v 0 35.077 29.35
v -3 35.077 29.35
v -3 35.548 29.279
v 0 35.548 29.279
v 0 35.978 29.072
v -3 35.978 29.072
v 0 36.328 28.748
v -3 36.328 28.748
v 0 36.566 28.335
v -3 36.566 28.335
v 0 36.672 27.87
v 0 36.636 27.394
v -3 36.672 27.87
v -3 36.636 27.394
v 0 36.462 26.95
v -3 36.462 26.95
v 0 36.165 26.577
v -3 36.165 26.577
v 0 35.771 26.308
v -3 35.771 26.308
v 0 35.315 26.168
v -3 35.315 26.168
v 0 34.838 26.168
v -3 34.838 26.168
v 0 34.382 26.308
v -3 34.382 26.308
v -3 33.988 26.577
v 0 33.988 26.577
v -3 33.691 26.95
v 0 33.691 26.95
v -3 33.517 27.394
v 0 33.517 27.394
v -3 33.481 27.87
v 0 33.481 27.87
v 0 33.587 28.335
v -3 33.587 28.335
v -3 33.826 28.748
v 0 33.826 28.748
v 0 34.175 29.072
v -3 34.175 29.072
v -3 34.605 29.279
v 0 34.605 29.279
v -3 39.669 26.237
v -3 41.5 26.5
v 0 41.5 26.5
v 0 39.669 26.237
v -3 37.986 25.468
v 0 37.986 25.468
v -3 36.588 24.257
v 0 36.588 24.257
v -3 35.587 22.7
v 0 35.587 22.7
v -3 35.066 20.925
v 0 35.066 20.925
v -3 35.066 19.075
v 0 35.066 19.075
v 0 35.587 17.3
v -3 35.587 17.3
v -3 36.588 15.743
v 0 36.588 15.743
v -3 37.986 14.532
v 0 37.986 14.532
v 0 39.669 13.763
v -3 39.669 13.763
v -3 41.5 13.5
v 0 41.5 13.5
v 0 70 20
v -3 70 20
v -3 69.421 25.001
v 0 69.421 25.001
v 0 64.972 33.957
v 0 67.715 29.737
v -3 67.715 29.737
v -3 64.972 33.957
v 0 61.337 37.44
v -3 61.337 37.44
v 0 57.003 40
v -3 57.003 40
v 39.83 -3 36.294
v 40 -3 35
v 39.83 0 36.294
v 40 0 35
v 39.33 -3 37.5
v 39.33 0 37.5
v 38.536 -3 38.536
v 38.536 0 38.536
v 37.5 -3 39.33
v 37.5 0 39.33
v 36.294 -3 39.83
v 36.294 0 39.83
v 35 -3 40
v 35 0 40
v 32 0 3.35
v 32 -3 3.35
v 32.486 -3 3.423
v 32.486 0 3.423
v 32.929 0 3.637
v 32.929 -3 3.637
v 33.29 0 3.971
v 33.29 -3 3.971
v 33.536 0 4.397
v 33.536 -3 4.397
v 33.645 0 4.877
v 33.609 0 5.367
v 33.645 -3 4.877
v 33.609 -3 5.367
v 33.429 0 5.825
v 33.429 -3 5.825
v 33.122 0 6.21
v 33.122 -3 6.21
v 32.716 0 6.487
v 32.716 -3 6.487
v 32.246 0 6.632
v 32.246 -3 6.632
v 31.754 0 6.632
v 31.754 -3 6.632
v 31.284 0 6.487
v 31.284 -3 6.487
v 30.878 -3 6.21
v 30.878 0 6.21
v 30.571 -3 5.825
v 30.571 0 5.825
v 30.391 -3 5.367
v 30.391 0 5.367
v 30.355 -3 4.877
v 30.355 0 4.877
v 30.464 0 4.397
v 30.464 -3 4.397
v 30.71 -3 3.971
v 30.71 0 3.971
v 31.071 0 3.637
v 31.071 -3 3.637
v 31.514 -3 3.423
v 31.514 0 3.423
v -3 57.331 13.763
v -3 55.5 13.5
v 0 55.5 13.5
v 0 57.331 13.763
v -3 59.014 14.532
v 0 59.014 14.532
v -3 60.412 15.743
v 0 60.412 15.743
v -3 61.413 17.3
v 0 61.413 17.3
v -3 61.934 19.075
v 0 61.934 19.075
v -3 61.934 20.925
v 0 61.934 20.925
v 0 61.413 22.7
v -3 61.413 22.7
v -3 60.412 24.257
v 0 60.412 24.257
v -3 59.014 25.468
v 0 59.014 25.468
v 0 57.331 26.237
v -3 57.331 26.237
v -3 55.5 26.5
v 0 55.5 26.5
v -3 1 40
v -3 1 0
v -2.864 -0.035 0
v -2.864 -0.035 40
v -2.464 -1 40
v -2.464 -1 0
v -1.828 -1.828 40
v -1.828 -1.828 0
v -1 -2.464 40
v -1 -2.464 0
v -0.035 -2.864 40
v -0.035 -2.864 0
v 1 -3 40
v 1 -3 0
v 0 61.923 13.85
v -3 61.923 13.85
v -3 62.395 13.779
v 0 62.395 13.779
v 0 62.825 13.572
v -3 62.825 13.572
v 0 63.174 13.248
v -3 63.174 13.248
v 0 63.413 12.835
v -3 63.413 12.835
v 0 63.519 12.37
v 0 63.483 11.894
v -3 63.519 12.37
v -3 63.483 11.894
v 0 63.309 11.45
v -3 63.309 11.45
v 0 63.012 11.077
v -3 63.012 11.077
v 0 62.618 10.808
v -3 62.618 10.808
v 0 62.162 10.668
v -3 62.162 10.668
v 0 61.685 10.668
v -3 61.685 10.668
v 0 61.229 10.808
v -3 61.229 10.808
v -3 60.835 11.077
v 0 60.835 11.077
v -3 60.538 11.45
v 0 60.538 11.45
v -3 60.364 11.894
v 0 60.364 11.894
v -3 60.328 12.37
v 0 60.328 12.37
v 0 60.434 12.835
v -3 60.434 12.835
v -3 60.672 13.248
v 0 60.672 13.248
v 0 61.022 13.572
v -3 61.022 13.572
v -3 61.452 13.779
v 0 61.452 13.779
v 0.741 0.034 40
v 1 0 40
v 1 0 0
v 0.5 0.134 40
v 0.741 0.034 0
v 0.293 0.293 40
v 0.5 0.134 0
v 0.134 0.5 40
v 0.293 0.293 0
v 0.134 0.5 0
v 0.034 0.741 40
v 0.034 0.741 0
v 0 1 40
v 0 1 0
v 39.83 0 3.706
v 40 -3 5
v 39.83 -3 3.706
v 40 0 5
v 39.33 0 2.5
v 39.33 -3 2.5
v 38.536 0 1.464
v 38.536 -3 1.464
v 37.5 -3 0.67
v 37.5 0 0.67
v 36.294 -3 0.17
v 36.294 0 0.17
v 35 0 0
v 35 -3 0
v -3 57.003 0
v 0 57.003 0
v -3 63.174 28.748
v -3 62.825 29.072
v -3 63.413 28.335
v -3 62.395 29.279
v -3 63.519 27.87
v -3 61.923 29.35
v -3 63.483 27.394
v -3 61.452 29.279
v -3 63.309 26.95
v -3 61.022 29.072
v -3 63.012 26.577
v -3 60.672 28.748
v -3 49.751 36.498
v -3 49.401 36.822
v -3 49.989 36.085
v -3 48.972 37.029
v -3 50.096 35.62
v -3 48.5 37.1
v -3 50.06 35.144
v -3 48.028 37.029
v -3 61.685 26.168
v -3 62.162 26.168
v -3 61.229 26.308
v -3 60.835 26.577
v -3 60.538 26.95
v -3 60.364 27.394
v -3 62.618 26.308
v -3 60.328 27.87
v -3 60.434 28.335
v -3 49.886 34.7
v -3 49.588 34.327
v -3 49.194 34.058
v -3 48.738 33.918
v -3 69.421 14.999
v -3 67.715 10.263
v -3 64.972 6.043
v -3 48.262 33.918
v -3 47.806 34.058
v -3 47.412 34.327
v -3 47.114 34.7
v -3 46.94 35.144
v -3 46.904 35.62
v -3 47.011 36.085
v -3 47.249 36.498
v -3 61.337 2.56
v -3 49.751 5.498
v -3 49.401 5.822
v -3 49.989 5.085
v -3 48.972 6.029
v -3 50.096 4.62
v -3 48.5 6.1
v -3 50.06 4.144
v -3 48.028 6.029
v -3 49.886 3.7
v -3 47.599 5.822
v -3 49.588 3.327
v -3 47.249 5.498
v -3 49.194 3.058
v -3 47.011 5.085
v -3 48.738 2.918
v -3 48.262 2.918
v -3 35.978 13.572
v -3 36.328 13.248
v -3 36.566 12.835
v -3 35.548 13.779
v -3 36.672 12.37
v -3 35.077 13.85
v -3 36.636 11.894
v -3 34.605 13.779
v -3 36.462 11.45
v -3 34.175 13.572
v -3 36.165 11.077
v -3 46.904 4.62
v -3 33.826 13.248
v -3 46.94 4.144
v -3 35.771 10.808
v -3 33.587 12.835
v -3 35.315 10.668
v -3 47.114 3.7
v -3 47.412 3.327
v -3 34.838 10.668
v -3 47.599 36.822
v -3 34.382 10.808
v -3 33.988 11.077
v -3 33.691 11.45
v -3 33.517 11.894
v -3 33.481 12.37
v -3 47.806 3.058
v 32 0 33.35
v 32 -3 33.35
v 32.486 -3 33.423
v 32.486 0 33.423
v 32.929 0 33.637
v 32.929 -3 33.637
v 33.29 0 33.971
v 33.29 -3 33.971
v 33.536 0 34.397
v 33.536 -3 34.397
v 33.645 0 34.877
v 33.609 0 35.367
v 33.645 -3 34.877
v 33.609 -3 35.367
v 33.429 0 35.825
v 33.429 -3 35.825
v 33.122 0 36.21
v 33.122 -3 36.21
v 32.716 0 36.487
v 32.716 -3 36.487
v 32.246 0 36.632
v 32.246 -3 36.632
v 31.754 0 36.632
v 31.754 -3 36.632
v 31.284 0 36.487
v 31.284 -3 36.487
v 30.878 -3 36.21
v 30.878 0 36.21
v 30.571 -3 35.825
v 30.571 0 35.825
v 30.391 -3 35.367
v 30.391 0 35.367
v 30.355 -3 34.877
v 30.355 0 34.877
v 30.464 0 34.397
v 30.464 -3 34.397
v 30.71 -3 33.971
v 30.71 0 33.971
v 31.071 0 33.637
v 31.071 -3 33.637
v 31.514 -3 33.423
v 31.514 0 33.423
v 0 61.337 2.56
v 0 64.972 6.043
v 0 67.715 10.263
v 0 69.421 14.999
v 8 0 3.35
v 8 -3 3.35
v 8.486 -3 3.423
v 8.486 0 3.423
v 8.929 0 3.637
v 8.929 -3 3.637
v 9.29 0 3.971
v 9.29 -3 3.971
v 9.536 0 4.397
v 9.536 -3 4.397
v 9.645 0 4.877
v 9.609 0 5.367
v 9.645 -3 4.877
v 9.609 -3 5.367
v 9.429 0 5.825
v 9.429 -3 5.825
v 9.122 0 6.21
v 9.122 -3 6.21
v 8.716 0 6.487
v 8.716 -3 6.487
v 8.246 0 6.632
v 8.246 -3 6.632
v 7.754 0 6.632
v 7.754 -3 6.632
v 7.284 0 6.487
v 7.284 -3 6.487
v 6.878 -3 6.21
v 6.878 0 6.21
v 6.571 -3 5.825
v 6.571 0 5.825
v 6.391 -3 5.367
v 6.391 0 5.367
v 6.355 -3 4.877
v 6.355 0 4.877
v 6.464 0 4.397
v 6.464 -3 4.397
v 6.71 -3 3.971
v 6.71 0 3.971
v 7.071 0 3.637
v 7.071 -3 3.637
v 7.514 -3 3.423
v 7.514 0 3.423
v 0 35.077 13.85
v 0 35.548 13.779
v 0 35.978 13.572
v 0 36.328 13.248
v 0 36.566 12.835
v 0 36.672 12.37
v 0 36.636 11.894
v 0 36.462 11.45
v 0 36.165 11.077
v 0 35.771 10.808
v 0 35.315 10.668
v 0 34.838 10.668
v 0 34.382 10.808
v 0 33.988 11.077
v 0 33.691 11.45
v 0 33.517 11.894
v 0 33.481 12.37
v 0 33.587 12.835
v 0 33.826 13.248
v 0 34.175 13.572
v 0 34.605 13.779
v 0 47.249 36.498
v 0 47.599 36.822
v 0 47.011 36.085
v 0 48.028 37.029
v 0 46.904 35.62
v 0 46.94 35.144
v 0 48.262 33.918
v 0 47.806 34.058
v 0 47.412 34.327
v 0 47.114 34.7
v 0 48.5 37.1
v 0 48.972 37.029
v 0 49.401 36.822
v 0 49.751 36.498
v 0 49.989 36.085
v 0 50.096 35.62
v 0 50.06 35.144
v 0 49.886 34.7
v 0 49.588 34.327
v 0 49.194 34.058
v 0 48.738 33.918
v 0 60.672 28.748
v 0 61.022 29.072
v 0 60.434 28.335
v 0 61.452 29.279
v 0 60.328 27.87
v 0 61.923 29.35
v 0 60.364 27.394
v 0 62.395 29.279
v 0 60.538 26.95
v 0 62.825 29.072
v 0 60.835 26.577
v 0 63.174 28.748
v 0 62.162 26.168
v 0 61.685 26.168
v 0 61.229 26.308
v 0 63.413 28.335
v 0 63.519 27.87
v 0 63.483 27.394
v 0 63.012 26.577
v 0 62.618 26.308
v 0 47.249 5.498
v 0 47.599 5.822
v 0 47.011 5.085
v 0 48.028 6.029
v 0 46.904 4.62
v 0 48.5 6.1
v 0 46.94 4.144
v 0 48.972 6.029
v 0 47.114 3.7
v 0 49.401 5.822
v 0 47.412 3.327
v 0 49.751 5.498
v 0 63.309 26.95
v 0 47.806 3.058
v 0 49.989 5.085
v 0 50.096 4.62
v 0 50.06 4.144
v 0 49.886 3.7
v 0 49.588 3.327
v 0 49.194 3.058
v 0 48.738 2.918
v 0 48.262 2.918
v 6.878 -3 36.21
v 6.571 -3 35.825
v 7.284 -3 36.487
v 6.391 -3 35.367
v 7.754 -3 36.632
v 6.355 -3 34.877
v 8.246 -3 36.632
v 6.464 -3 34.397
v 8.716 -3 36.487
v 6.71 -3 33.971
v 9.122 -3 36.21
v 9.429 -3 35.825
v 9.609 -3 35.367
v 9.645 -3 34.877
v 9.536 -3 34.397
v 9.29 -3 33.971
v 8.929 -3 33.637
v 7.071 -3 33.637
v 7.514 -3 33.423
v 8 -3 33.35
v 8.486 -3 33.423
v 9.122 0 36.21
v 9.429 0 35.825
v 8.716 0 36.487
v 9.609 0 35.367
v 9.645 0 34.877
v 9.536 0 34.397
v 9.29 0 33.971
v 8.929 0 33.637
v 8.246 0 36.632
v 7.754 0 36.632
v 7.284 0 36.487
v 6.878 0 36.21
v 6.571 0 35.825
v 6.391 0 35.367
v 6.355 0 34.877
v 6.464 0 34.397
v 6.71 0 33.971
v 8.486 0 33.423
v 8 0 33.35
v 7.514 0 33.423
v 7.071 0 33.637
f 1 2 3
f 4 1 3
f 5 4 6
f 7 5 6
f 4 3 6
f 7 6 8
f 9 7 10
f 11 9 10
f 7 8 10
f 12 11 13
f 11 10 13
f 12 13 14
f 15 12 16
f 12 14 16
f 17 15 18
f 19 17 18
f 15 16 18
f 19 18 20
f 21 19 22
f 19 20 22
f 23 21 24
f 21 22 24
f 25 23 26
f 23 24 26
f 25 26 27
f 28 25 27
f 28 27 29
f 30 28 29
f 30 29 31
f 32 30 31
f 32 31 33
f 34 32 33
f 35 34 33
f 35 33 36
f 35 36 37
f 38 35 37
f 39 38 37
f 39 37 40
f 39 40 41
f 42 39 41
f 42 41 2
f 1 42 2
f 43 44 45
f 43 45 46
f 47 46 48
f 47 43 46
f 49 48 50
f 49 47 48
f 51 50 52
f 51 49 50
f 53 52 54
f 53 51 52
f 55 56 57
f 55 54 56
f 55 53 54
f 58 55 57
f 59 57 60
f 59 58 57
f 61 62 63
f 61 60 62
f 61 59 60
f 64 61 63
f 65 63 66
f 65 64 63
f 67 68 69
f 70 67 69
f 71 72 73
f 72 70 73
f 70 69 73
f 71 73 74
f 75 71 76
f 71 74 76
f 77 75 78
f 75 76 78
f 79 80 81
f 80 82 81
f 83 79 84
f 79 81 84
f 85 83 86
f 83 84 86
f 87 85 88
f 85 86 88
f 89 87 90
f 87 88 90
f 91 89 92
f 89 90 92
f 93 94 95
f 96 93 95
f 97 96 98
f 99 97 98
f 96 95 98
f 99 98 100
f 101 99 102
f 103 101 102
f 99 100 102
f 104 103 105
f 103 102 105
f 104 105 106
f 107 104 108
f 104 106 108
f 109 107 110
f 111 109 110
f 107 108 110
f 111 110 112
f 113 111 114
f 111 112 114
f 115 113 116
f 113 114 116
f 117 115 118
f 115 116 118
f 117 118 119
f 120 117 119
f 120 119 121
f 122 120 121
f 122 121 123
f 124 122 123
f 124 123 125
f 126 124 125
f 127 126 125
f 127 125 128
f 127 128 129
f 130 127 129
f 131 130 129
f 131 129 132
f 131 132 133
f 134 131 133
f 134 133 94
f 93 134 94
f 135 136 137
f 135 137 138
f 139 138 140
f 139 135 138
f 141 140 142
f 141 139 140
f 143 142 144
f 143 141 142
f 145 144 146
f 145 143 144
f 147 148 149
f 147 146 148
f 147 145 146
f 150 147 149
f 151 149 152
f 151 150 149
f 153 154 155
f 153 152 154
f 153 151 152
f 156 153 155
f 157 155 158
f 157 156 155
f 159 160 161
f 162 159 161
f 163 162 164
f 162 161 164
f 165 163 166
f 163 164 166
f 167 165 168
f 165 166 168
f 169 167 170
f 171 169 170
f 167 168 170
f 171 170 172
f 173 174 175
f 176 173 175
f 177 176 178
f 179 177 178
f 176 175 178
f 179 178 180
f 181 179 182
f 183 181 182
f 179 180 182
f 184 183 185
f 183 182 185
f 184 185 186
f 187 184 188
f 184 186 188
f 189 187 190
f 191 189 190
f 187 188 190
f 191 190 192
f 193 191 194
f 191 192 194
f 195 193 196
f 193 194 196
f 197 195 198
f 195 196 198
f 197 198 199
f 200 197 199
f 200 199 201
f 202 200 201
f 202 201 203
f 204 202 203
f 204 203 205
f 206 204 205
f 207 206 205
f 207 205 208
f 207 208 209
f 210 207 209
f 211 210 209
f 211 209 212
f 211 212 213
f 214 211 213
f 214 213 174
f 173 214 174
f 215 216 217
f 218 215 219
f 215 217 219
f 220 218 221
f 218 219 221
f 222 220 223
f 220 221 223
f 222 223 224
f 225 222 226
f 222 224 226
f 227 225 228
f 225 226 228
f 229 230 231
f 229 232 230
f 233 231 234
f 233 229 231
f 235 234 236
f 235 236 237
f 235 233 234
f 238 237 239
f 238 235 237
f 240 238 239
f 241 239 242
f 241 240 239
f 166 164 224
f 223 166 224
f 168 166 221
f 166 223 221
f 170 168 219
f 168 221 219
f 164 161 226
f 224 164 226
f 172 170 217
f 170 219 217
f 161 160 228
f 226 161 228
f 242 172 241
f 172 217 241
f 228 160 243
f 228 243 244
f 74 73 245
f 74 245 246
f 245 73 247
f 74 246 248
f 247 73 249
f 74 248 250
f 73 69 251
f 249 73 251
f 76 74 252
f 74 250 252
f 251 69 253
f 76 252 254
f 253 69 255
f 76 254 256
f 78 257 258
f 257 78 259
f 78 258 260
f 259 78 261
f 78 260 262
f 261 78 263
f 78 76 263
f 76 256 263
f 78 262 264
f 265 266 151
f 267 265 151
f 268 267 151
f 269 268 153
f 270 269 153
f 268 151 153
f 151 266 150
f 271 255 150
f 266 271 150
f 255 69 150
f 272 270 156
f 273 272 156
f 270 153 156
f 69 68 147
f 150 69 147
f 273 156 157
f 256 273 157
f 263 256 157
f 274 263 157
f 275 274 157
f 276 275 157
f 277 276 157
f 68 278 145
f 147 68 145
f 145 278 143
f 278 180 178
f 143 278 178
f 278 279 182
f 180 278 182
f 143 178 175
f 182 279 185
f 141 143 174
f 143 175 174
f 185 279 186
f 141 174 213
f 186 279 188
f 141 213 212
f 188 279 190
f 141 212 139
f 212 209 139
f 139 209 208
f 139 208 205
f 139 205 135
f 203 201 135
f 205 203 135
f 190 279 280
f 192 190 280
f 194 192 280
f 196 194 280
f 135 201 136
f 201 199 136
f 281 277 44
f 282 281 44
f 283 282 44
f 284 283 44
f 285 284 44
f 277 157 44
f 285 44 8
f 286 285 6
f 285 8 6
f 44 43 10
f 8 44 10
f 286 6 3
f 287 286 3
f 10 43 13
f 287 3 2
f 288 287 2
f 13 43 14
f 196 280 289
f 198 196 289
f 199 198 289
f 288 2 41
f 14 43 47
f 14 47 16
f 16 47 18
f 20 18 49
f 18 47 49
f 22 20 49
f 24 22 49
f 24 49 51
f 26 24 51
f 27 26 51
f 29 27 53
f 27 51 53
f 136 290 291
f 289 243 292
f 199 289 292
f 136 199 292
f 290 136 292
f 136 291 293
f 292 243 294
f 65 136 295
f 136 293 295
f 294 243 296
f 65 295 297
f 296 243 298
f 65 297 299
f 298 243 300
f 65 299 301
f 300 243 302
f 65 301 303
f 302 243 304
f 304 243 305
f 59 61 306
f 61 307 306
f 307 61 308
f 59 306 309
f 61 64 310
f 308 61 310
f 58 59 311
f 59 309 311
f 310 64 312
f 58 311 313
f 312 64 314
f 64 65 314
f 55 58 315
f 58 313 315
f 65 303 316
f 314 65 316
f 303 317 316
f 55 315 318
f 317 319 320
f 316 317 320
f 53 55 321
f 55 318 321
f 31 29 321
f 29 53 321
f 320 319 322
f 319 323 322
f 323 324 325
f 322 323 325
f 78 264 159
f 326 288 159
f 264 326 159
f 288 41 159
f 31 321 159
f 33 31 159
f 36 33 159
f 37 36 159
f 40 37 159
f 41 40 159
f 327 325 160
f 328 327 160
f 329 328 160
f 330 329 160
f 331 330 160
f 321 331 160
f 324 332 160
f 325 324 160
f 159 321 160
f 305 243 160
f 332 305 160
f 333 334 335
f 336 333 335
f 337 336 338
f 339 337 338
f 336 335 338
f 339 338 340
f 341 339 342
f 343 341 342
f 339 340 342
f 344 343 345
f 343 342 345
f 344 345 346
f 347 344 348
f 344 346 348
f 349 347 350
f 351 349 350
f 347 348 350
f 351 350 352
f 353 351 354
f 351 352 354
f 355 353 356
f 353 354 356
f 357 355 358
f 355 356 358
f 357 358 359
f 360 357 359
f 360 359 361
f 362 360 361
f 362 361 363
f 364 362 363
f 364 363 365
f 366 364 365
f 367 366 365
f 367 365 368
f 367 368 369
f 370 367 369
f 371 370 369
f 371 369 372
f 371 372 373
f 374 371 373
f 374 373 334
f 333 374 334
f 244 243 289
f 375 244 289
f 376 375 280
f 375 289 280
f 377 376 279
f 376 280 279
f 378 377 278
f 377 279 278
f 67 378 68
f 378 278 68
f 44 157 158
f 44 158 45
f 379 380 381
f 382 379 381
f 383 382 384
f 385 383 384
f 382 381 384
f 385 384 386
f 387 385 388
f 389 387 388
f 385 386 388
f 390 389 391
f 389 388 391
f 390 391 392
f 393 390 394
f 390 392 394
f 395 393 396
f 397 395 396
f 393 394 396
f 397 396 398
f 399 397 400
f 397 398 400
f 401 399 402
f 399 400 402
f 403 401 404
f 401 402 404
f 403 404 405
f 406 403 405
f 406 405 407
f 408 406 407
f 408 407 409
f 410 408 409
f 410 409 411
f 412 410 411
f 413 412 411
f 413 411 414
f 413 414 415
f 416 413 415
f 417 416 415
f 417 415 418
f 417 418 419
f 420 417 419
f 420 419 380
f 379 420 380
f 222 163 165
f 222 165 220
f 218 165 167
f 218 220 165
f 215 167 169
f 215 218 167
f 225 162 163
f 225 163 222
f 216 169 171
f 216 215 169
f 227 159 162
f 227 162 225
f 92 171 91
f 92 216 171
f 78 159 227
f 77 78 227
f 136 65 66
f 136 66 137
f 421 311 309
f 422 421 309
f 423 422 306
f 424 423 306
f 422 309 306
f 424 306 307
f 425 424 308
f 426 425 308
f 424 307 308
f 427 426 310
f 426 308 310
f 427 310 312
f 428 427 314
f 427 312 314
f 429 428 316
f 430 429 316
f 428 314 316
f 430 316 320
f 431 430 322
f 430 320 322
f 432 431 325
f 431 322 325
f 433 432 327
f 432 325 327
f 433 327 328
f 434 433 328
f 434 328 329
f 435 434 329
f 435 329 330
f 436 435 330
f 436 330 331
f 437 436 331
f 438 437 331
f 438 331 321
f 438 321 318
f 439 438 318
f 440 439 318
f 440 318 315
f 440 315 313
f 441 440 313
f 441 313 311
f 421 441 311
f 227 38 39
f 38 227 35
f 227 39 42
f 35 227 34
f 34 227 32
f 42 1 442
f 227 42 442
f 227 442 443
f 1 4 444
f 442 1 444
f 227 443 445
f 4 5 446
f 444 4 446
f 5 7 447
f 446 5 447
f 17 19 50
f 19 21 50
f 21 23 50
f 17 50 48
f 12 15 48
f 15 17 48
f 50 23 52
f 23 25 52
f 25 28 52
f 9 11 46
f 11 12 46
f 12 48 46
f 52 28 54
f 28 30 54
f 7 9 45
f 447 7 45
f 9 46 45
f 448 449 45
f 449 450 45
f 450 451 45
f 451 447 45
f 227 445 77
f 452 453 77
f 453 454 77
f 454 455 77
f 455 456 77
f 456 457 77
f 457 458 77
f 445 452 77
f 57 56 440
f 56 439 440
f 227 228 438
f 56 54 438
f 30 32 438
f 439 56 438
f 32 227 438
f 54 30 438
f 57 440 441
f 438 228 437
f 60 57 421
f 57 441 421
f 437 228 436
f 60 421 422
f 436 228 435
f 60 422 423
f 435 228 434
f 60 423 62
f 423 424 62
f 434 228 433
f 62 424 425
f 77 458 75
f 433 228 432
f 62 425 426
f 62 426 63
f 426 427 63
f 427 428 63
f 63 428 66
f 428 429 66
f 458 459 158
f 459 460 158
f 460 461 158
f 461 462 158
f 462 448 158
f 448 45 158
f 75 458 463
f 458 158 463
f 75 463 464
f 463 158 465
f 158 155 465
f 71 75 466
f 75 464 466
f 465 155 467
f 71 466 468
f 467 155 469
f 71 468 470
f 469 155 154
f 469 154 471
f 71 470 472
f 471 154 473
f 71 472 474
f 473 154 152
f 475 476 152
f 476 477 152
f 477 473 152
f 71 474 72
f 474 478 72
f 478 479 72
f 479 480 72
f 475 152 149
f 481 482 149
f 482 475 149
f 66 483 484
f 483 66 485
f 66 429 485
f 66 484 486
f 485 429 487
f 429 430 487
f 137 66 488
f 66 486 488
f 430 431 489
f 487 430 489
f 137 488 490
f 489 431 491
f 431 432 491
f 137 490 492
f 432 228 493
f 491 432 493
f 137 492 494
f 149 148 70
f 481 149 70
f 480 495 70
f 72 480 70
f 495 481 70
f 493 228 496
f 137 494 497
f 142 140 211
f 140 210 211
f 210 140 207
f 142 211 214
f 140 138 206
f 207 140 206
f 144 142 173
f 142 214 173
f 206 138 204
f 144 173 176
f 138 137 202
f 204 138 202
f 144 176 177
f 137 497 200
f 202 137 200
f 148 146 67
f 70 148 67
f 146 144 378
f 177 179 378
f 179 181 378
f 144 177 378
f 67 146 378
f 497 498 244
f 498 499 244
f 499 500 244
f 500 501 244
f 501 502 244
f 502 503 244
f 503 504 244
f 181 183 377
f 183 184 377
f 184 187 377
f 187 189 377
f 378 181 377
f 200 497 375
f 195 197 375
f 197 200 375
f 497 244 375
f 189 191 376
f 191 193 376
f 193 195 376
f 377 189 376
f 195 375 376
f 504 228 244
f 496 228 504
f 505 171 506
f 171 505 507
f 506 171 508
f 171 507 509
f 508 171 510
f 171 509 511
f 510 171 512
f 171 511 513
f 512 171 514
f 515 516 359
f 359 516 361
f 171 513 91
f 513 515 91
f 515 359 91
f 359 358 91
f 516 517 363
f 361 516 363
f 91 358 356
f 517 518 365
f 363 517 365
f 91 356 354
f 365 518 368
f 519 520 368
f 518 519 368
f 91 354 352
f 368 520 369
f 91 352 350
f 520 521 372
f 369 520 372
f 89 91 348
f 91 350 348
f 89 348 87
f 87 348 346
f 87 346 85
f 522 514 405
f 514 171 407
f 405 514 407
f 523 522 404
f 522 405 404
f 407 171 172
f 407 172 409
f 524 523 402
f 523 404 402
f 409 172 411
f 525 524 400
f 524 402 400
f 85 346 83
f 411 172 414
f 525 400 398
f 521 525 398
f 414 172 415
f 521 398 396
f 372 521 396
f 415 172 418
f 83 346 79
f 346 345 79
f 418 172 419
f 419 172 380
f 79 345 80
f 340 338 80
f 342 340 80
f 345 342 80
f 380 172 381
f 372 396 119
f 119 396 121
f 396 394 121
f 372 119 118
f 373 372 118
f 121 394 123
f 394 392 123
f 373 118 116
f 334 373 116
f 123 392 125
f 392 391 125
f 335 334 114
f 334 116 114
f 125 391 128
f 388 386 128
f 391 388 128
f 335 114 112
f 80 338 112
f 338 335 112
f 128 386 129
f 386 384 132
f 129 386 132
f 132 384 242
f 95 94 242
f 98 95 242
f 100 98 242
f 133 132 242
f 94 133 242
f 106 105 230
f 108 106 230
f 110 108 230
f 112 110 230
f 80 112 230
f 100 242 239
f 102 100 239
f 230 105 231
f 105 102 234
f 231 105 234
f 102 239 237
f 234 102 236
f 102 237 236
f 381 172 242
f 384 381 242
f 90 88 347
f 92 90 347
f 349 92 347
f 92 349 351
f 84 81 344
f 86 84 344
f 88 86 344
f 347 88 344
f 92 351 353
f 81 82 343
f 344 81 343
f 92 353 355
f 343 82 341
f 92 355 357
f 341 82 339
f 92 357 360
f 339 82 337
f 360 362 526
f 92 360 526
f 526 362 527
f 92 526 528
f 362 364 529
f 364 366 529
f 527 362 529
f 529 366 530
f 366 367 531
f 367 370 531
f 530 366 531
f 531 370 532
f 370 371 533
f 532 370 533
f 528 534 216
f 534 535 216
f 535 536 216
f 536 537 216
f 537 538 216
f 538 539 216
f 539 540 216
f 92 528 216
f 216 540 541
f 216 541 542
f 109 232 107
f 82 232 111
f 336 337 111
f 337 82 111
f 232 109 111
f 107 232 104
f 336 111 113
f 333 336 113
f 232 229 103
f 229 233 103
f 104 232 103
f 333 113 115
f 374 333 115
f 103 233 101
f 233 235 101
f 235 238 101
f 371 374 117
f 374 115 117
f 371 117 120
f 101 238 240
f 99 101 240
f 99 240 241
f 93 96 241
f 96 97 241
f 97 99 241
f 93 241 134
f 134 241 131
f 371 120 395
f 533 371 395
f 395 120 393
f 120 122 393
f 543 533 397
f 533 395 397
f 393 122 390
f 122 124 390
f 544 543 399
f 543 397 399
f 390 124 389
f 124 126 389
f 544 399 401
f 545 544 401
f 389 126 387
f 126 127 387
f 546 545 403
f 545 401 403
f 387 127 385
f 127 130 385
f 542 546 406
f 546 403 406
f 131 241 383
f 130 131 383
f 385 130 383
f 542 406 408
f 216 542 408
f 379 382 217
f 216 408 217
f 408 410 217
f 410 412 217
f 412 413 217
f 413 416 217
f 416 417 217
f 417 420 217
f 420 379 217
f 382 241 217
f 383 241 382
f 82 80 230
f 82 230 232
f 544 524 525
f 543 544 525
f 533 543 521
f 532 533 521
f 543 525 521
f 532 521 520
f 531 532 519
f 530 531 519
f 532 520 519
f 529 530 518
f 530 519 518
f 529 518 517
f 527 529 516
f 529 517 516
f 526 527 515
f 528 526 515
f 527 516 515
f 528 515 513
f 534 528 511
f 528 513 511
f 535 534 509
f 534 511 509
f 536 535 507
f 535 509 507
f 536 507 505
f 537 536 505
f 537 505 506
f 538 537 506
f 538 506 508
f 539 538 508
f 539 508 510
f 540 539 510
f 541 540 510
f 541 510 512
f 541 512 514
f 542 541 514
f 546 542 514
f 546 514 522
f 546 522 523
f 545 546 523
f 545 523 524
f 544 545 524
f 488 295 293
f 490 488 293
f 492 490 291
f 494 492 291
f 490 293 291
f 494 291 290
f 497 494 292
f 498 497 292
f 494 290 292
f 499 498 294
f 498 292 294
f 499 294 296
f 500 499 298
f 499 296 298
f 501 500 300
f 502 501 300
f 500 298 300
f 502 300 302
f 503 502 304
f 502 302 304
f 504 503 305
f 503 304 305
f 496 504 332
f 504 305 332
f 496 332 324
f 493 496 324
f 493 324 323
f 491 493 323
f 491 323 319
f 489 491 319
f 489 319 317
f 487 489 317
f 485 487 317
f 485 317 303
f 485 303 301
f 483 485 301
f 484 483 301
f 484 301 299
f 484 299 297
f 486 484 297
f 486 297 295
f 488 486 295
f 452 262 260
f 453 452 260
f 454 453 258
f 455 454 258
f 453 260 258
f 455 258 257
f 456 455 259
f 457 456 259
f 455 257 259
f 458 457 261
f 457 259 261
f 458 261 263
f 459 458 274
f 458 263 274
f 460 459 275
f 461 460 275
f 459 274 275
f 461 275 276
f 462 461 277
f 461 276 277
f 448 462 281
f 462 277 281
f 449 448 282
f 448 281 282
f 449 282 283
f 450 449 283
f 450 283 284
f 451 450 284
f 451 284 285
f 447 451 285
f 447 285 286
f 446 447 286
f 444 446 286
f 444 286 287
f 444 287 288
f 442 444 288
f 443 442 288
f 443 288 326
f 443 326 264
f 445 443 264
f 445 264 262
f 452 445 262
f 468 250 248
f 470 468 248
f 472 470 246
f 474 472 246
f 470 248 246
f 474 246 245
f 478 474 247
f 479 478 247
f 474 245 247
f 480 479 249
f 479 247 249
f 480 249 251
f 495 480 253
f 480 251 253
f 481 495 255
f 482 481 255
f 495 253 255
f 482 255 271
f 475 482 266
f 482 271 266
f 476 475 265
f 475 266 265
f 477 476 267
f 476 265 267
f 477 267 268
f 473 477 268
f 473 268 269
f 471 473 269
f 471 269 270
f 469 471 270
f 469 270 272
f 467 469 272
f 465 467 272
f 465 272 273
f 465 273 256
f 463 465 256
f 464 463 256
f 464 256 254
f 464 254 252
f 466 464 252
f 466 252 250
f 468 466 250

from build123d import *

# Parameters (mm, degrees)
SM_BASE_FLANGE_1_DEPTH      = 40
CUT_EXTRUDE_3_DEPTH         = 10
CUT_EXTRUDE_1_DEPTH         = 92.372862492
SKETCH_7_R                  = 1.6
CUT_EXTRUDE_2_DEPTH         = 92.372862492
SKETCH_9_R                  = 1.65
CUT_EXTRUDE_4_DEPTH         = 93.352585237
PATTERN_LINEAR_1_COUNT      = 2
PATTERN_LINEAR_1_PITCH      = 30
PATTERN_LINEAR_1_COUNT_DIR2 = 2
PATTERN_LINEAR_1_PITCH_DIR2 = 24
FILLET_1_R                  = 5


# Sheet-metal steps are written as plain solids
with BuildPart() as part:
    # Sketch 1 → 基材-凸緣1 (new body)
    with BuildSketch(Plane.XY):
        with BuildLine():
            Line((40, 0), (1, 0))
            ThreePointArc((1, 0), (0.292893219, 0.292893219), (0, 1))
            Line((0, 1), (0, 70))
            Line((0, 70), (-3, 70))
            Line((-3, 70), (-3, 1))
            ThreePointArc((-3, 1), (-1.828427125, -1.828427125), (1, -3))
            Line((1, -3), (40, -3))
            Line((40, -3), (40, 0))
        make_face()
    extrude(amount=SM_BASE_FLANGE_1_DEPTH)

    # 草圖8 → 除料-伸長3 (cut)
    with BuildSketch(Plane.ZY.offset(3)):
        with BuildLine():
            Line((0, 70), (0, 57.002788981))
            ThreePointArc((0, 57.002788981), (8.073899482, 66.465261916), (20, 70))
            Line((20, 70), (0, 70))
        make_face()
        with BuildLine():
            ThreePointArc((20, 70), (31.926100518, 66.465261916), (40, 57.002788981))
            Line((40, 57.002788981), (40, 70))
            Line((40, 70), (20, 70))
        make_face()
    extrude(amount=-CUT_EXTRUDE_3_DEPTH, mode=Mode.SUBTRACT)

    # 草圖6 → 除料-伸長1 (cut, through all)
    with BuildSketch(Plane.ZY.offset(3)):
        with BuildLine():
            Line((26.5, 55.5), (26.5, 41.5))
            ThreePointArc((26.5, 41.5), (20, 35), (13.5, 41.5))
            Line((13.5, 41.5), (13.5, 55.5))
            ThreePointArc((13.5, 55.5), (20, 62), (26.5, 55.5))
        make_face()
    extrude(amount=-CUT_EXTRUDE_1_DEPTH, mode=Mode.SUBTRACT)

    # 草圖7 → 除料-伸長2 (cut, through all)
    with BuildSketch(Plane.ZY.offset(3)):
        with Locations((4.5, 48.5)):
            Circle(SKETCH_7_R)
        with Locations((12.25, 35.076606241)):
            Circle(SKETCH_7_R)
        with Locations((27.75, 35.076606241)):
            Circle(SKETCH_7_R)
        with Locations((35.5, 48.5)):
            Circle(SKETCH_7_R)
        with Locations((27.75, 61.923393759)):
            Circle(SKETCH_7_R)
        with Locations((12.25, 61.923393759)):
            Circle(SKETCH_7_R)
    extrude(amount=-CUT_EXTRUDE_2_DEPTH, mode=Mode.SUBTRACT)

    # 草圖9 → 除料-伸長4 (cut, through all)
    with BuildSketch(Plane.XZ.offset(3)):
        with Locations(Location((32, 35, 0), (0, 0, 270))):
            Circle(SKETCH_9_R)
    cut_extrude_4 = extrude(amount=-CUT_EXTRUDE_4_DEPTH, mode=Mode.SUBTRACT)

    # 直線複製排列1: Cut-Extrude 4 2 × 2
    with Locations(*[(-j * PATTERN_LINEAR_1_PITCH_DIR2, 0, -i * PATTERN_LINEAR_1_PITCH) for i in range(PATTERN_LINEAR_1_COUNT) for j in range(PATTERN_LINEAR_1_COUNT_DIR2) if (i, j) != (0, 0)]):
        add(cut_extrude_4, mode=Mode.SUBTRACT)

    # 圓角1
    fillet_1_edges = [part.edges().sort_by_distance(p)[0] for p in [
        (40, -1.5, 40),
        (40, -1.5, 0),
    ]]
    fillet(fillet_1_edges, radius=FILLET_1_R)


solid = part.part
